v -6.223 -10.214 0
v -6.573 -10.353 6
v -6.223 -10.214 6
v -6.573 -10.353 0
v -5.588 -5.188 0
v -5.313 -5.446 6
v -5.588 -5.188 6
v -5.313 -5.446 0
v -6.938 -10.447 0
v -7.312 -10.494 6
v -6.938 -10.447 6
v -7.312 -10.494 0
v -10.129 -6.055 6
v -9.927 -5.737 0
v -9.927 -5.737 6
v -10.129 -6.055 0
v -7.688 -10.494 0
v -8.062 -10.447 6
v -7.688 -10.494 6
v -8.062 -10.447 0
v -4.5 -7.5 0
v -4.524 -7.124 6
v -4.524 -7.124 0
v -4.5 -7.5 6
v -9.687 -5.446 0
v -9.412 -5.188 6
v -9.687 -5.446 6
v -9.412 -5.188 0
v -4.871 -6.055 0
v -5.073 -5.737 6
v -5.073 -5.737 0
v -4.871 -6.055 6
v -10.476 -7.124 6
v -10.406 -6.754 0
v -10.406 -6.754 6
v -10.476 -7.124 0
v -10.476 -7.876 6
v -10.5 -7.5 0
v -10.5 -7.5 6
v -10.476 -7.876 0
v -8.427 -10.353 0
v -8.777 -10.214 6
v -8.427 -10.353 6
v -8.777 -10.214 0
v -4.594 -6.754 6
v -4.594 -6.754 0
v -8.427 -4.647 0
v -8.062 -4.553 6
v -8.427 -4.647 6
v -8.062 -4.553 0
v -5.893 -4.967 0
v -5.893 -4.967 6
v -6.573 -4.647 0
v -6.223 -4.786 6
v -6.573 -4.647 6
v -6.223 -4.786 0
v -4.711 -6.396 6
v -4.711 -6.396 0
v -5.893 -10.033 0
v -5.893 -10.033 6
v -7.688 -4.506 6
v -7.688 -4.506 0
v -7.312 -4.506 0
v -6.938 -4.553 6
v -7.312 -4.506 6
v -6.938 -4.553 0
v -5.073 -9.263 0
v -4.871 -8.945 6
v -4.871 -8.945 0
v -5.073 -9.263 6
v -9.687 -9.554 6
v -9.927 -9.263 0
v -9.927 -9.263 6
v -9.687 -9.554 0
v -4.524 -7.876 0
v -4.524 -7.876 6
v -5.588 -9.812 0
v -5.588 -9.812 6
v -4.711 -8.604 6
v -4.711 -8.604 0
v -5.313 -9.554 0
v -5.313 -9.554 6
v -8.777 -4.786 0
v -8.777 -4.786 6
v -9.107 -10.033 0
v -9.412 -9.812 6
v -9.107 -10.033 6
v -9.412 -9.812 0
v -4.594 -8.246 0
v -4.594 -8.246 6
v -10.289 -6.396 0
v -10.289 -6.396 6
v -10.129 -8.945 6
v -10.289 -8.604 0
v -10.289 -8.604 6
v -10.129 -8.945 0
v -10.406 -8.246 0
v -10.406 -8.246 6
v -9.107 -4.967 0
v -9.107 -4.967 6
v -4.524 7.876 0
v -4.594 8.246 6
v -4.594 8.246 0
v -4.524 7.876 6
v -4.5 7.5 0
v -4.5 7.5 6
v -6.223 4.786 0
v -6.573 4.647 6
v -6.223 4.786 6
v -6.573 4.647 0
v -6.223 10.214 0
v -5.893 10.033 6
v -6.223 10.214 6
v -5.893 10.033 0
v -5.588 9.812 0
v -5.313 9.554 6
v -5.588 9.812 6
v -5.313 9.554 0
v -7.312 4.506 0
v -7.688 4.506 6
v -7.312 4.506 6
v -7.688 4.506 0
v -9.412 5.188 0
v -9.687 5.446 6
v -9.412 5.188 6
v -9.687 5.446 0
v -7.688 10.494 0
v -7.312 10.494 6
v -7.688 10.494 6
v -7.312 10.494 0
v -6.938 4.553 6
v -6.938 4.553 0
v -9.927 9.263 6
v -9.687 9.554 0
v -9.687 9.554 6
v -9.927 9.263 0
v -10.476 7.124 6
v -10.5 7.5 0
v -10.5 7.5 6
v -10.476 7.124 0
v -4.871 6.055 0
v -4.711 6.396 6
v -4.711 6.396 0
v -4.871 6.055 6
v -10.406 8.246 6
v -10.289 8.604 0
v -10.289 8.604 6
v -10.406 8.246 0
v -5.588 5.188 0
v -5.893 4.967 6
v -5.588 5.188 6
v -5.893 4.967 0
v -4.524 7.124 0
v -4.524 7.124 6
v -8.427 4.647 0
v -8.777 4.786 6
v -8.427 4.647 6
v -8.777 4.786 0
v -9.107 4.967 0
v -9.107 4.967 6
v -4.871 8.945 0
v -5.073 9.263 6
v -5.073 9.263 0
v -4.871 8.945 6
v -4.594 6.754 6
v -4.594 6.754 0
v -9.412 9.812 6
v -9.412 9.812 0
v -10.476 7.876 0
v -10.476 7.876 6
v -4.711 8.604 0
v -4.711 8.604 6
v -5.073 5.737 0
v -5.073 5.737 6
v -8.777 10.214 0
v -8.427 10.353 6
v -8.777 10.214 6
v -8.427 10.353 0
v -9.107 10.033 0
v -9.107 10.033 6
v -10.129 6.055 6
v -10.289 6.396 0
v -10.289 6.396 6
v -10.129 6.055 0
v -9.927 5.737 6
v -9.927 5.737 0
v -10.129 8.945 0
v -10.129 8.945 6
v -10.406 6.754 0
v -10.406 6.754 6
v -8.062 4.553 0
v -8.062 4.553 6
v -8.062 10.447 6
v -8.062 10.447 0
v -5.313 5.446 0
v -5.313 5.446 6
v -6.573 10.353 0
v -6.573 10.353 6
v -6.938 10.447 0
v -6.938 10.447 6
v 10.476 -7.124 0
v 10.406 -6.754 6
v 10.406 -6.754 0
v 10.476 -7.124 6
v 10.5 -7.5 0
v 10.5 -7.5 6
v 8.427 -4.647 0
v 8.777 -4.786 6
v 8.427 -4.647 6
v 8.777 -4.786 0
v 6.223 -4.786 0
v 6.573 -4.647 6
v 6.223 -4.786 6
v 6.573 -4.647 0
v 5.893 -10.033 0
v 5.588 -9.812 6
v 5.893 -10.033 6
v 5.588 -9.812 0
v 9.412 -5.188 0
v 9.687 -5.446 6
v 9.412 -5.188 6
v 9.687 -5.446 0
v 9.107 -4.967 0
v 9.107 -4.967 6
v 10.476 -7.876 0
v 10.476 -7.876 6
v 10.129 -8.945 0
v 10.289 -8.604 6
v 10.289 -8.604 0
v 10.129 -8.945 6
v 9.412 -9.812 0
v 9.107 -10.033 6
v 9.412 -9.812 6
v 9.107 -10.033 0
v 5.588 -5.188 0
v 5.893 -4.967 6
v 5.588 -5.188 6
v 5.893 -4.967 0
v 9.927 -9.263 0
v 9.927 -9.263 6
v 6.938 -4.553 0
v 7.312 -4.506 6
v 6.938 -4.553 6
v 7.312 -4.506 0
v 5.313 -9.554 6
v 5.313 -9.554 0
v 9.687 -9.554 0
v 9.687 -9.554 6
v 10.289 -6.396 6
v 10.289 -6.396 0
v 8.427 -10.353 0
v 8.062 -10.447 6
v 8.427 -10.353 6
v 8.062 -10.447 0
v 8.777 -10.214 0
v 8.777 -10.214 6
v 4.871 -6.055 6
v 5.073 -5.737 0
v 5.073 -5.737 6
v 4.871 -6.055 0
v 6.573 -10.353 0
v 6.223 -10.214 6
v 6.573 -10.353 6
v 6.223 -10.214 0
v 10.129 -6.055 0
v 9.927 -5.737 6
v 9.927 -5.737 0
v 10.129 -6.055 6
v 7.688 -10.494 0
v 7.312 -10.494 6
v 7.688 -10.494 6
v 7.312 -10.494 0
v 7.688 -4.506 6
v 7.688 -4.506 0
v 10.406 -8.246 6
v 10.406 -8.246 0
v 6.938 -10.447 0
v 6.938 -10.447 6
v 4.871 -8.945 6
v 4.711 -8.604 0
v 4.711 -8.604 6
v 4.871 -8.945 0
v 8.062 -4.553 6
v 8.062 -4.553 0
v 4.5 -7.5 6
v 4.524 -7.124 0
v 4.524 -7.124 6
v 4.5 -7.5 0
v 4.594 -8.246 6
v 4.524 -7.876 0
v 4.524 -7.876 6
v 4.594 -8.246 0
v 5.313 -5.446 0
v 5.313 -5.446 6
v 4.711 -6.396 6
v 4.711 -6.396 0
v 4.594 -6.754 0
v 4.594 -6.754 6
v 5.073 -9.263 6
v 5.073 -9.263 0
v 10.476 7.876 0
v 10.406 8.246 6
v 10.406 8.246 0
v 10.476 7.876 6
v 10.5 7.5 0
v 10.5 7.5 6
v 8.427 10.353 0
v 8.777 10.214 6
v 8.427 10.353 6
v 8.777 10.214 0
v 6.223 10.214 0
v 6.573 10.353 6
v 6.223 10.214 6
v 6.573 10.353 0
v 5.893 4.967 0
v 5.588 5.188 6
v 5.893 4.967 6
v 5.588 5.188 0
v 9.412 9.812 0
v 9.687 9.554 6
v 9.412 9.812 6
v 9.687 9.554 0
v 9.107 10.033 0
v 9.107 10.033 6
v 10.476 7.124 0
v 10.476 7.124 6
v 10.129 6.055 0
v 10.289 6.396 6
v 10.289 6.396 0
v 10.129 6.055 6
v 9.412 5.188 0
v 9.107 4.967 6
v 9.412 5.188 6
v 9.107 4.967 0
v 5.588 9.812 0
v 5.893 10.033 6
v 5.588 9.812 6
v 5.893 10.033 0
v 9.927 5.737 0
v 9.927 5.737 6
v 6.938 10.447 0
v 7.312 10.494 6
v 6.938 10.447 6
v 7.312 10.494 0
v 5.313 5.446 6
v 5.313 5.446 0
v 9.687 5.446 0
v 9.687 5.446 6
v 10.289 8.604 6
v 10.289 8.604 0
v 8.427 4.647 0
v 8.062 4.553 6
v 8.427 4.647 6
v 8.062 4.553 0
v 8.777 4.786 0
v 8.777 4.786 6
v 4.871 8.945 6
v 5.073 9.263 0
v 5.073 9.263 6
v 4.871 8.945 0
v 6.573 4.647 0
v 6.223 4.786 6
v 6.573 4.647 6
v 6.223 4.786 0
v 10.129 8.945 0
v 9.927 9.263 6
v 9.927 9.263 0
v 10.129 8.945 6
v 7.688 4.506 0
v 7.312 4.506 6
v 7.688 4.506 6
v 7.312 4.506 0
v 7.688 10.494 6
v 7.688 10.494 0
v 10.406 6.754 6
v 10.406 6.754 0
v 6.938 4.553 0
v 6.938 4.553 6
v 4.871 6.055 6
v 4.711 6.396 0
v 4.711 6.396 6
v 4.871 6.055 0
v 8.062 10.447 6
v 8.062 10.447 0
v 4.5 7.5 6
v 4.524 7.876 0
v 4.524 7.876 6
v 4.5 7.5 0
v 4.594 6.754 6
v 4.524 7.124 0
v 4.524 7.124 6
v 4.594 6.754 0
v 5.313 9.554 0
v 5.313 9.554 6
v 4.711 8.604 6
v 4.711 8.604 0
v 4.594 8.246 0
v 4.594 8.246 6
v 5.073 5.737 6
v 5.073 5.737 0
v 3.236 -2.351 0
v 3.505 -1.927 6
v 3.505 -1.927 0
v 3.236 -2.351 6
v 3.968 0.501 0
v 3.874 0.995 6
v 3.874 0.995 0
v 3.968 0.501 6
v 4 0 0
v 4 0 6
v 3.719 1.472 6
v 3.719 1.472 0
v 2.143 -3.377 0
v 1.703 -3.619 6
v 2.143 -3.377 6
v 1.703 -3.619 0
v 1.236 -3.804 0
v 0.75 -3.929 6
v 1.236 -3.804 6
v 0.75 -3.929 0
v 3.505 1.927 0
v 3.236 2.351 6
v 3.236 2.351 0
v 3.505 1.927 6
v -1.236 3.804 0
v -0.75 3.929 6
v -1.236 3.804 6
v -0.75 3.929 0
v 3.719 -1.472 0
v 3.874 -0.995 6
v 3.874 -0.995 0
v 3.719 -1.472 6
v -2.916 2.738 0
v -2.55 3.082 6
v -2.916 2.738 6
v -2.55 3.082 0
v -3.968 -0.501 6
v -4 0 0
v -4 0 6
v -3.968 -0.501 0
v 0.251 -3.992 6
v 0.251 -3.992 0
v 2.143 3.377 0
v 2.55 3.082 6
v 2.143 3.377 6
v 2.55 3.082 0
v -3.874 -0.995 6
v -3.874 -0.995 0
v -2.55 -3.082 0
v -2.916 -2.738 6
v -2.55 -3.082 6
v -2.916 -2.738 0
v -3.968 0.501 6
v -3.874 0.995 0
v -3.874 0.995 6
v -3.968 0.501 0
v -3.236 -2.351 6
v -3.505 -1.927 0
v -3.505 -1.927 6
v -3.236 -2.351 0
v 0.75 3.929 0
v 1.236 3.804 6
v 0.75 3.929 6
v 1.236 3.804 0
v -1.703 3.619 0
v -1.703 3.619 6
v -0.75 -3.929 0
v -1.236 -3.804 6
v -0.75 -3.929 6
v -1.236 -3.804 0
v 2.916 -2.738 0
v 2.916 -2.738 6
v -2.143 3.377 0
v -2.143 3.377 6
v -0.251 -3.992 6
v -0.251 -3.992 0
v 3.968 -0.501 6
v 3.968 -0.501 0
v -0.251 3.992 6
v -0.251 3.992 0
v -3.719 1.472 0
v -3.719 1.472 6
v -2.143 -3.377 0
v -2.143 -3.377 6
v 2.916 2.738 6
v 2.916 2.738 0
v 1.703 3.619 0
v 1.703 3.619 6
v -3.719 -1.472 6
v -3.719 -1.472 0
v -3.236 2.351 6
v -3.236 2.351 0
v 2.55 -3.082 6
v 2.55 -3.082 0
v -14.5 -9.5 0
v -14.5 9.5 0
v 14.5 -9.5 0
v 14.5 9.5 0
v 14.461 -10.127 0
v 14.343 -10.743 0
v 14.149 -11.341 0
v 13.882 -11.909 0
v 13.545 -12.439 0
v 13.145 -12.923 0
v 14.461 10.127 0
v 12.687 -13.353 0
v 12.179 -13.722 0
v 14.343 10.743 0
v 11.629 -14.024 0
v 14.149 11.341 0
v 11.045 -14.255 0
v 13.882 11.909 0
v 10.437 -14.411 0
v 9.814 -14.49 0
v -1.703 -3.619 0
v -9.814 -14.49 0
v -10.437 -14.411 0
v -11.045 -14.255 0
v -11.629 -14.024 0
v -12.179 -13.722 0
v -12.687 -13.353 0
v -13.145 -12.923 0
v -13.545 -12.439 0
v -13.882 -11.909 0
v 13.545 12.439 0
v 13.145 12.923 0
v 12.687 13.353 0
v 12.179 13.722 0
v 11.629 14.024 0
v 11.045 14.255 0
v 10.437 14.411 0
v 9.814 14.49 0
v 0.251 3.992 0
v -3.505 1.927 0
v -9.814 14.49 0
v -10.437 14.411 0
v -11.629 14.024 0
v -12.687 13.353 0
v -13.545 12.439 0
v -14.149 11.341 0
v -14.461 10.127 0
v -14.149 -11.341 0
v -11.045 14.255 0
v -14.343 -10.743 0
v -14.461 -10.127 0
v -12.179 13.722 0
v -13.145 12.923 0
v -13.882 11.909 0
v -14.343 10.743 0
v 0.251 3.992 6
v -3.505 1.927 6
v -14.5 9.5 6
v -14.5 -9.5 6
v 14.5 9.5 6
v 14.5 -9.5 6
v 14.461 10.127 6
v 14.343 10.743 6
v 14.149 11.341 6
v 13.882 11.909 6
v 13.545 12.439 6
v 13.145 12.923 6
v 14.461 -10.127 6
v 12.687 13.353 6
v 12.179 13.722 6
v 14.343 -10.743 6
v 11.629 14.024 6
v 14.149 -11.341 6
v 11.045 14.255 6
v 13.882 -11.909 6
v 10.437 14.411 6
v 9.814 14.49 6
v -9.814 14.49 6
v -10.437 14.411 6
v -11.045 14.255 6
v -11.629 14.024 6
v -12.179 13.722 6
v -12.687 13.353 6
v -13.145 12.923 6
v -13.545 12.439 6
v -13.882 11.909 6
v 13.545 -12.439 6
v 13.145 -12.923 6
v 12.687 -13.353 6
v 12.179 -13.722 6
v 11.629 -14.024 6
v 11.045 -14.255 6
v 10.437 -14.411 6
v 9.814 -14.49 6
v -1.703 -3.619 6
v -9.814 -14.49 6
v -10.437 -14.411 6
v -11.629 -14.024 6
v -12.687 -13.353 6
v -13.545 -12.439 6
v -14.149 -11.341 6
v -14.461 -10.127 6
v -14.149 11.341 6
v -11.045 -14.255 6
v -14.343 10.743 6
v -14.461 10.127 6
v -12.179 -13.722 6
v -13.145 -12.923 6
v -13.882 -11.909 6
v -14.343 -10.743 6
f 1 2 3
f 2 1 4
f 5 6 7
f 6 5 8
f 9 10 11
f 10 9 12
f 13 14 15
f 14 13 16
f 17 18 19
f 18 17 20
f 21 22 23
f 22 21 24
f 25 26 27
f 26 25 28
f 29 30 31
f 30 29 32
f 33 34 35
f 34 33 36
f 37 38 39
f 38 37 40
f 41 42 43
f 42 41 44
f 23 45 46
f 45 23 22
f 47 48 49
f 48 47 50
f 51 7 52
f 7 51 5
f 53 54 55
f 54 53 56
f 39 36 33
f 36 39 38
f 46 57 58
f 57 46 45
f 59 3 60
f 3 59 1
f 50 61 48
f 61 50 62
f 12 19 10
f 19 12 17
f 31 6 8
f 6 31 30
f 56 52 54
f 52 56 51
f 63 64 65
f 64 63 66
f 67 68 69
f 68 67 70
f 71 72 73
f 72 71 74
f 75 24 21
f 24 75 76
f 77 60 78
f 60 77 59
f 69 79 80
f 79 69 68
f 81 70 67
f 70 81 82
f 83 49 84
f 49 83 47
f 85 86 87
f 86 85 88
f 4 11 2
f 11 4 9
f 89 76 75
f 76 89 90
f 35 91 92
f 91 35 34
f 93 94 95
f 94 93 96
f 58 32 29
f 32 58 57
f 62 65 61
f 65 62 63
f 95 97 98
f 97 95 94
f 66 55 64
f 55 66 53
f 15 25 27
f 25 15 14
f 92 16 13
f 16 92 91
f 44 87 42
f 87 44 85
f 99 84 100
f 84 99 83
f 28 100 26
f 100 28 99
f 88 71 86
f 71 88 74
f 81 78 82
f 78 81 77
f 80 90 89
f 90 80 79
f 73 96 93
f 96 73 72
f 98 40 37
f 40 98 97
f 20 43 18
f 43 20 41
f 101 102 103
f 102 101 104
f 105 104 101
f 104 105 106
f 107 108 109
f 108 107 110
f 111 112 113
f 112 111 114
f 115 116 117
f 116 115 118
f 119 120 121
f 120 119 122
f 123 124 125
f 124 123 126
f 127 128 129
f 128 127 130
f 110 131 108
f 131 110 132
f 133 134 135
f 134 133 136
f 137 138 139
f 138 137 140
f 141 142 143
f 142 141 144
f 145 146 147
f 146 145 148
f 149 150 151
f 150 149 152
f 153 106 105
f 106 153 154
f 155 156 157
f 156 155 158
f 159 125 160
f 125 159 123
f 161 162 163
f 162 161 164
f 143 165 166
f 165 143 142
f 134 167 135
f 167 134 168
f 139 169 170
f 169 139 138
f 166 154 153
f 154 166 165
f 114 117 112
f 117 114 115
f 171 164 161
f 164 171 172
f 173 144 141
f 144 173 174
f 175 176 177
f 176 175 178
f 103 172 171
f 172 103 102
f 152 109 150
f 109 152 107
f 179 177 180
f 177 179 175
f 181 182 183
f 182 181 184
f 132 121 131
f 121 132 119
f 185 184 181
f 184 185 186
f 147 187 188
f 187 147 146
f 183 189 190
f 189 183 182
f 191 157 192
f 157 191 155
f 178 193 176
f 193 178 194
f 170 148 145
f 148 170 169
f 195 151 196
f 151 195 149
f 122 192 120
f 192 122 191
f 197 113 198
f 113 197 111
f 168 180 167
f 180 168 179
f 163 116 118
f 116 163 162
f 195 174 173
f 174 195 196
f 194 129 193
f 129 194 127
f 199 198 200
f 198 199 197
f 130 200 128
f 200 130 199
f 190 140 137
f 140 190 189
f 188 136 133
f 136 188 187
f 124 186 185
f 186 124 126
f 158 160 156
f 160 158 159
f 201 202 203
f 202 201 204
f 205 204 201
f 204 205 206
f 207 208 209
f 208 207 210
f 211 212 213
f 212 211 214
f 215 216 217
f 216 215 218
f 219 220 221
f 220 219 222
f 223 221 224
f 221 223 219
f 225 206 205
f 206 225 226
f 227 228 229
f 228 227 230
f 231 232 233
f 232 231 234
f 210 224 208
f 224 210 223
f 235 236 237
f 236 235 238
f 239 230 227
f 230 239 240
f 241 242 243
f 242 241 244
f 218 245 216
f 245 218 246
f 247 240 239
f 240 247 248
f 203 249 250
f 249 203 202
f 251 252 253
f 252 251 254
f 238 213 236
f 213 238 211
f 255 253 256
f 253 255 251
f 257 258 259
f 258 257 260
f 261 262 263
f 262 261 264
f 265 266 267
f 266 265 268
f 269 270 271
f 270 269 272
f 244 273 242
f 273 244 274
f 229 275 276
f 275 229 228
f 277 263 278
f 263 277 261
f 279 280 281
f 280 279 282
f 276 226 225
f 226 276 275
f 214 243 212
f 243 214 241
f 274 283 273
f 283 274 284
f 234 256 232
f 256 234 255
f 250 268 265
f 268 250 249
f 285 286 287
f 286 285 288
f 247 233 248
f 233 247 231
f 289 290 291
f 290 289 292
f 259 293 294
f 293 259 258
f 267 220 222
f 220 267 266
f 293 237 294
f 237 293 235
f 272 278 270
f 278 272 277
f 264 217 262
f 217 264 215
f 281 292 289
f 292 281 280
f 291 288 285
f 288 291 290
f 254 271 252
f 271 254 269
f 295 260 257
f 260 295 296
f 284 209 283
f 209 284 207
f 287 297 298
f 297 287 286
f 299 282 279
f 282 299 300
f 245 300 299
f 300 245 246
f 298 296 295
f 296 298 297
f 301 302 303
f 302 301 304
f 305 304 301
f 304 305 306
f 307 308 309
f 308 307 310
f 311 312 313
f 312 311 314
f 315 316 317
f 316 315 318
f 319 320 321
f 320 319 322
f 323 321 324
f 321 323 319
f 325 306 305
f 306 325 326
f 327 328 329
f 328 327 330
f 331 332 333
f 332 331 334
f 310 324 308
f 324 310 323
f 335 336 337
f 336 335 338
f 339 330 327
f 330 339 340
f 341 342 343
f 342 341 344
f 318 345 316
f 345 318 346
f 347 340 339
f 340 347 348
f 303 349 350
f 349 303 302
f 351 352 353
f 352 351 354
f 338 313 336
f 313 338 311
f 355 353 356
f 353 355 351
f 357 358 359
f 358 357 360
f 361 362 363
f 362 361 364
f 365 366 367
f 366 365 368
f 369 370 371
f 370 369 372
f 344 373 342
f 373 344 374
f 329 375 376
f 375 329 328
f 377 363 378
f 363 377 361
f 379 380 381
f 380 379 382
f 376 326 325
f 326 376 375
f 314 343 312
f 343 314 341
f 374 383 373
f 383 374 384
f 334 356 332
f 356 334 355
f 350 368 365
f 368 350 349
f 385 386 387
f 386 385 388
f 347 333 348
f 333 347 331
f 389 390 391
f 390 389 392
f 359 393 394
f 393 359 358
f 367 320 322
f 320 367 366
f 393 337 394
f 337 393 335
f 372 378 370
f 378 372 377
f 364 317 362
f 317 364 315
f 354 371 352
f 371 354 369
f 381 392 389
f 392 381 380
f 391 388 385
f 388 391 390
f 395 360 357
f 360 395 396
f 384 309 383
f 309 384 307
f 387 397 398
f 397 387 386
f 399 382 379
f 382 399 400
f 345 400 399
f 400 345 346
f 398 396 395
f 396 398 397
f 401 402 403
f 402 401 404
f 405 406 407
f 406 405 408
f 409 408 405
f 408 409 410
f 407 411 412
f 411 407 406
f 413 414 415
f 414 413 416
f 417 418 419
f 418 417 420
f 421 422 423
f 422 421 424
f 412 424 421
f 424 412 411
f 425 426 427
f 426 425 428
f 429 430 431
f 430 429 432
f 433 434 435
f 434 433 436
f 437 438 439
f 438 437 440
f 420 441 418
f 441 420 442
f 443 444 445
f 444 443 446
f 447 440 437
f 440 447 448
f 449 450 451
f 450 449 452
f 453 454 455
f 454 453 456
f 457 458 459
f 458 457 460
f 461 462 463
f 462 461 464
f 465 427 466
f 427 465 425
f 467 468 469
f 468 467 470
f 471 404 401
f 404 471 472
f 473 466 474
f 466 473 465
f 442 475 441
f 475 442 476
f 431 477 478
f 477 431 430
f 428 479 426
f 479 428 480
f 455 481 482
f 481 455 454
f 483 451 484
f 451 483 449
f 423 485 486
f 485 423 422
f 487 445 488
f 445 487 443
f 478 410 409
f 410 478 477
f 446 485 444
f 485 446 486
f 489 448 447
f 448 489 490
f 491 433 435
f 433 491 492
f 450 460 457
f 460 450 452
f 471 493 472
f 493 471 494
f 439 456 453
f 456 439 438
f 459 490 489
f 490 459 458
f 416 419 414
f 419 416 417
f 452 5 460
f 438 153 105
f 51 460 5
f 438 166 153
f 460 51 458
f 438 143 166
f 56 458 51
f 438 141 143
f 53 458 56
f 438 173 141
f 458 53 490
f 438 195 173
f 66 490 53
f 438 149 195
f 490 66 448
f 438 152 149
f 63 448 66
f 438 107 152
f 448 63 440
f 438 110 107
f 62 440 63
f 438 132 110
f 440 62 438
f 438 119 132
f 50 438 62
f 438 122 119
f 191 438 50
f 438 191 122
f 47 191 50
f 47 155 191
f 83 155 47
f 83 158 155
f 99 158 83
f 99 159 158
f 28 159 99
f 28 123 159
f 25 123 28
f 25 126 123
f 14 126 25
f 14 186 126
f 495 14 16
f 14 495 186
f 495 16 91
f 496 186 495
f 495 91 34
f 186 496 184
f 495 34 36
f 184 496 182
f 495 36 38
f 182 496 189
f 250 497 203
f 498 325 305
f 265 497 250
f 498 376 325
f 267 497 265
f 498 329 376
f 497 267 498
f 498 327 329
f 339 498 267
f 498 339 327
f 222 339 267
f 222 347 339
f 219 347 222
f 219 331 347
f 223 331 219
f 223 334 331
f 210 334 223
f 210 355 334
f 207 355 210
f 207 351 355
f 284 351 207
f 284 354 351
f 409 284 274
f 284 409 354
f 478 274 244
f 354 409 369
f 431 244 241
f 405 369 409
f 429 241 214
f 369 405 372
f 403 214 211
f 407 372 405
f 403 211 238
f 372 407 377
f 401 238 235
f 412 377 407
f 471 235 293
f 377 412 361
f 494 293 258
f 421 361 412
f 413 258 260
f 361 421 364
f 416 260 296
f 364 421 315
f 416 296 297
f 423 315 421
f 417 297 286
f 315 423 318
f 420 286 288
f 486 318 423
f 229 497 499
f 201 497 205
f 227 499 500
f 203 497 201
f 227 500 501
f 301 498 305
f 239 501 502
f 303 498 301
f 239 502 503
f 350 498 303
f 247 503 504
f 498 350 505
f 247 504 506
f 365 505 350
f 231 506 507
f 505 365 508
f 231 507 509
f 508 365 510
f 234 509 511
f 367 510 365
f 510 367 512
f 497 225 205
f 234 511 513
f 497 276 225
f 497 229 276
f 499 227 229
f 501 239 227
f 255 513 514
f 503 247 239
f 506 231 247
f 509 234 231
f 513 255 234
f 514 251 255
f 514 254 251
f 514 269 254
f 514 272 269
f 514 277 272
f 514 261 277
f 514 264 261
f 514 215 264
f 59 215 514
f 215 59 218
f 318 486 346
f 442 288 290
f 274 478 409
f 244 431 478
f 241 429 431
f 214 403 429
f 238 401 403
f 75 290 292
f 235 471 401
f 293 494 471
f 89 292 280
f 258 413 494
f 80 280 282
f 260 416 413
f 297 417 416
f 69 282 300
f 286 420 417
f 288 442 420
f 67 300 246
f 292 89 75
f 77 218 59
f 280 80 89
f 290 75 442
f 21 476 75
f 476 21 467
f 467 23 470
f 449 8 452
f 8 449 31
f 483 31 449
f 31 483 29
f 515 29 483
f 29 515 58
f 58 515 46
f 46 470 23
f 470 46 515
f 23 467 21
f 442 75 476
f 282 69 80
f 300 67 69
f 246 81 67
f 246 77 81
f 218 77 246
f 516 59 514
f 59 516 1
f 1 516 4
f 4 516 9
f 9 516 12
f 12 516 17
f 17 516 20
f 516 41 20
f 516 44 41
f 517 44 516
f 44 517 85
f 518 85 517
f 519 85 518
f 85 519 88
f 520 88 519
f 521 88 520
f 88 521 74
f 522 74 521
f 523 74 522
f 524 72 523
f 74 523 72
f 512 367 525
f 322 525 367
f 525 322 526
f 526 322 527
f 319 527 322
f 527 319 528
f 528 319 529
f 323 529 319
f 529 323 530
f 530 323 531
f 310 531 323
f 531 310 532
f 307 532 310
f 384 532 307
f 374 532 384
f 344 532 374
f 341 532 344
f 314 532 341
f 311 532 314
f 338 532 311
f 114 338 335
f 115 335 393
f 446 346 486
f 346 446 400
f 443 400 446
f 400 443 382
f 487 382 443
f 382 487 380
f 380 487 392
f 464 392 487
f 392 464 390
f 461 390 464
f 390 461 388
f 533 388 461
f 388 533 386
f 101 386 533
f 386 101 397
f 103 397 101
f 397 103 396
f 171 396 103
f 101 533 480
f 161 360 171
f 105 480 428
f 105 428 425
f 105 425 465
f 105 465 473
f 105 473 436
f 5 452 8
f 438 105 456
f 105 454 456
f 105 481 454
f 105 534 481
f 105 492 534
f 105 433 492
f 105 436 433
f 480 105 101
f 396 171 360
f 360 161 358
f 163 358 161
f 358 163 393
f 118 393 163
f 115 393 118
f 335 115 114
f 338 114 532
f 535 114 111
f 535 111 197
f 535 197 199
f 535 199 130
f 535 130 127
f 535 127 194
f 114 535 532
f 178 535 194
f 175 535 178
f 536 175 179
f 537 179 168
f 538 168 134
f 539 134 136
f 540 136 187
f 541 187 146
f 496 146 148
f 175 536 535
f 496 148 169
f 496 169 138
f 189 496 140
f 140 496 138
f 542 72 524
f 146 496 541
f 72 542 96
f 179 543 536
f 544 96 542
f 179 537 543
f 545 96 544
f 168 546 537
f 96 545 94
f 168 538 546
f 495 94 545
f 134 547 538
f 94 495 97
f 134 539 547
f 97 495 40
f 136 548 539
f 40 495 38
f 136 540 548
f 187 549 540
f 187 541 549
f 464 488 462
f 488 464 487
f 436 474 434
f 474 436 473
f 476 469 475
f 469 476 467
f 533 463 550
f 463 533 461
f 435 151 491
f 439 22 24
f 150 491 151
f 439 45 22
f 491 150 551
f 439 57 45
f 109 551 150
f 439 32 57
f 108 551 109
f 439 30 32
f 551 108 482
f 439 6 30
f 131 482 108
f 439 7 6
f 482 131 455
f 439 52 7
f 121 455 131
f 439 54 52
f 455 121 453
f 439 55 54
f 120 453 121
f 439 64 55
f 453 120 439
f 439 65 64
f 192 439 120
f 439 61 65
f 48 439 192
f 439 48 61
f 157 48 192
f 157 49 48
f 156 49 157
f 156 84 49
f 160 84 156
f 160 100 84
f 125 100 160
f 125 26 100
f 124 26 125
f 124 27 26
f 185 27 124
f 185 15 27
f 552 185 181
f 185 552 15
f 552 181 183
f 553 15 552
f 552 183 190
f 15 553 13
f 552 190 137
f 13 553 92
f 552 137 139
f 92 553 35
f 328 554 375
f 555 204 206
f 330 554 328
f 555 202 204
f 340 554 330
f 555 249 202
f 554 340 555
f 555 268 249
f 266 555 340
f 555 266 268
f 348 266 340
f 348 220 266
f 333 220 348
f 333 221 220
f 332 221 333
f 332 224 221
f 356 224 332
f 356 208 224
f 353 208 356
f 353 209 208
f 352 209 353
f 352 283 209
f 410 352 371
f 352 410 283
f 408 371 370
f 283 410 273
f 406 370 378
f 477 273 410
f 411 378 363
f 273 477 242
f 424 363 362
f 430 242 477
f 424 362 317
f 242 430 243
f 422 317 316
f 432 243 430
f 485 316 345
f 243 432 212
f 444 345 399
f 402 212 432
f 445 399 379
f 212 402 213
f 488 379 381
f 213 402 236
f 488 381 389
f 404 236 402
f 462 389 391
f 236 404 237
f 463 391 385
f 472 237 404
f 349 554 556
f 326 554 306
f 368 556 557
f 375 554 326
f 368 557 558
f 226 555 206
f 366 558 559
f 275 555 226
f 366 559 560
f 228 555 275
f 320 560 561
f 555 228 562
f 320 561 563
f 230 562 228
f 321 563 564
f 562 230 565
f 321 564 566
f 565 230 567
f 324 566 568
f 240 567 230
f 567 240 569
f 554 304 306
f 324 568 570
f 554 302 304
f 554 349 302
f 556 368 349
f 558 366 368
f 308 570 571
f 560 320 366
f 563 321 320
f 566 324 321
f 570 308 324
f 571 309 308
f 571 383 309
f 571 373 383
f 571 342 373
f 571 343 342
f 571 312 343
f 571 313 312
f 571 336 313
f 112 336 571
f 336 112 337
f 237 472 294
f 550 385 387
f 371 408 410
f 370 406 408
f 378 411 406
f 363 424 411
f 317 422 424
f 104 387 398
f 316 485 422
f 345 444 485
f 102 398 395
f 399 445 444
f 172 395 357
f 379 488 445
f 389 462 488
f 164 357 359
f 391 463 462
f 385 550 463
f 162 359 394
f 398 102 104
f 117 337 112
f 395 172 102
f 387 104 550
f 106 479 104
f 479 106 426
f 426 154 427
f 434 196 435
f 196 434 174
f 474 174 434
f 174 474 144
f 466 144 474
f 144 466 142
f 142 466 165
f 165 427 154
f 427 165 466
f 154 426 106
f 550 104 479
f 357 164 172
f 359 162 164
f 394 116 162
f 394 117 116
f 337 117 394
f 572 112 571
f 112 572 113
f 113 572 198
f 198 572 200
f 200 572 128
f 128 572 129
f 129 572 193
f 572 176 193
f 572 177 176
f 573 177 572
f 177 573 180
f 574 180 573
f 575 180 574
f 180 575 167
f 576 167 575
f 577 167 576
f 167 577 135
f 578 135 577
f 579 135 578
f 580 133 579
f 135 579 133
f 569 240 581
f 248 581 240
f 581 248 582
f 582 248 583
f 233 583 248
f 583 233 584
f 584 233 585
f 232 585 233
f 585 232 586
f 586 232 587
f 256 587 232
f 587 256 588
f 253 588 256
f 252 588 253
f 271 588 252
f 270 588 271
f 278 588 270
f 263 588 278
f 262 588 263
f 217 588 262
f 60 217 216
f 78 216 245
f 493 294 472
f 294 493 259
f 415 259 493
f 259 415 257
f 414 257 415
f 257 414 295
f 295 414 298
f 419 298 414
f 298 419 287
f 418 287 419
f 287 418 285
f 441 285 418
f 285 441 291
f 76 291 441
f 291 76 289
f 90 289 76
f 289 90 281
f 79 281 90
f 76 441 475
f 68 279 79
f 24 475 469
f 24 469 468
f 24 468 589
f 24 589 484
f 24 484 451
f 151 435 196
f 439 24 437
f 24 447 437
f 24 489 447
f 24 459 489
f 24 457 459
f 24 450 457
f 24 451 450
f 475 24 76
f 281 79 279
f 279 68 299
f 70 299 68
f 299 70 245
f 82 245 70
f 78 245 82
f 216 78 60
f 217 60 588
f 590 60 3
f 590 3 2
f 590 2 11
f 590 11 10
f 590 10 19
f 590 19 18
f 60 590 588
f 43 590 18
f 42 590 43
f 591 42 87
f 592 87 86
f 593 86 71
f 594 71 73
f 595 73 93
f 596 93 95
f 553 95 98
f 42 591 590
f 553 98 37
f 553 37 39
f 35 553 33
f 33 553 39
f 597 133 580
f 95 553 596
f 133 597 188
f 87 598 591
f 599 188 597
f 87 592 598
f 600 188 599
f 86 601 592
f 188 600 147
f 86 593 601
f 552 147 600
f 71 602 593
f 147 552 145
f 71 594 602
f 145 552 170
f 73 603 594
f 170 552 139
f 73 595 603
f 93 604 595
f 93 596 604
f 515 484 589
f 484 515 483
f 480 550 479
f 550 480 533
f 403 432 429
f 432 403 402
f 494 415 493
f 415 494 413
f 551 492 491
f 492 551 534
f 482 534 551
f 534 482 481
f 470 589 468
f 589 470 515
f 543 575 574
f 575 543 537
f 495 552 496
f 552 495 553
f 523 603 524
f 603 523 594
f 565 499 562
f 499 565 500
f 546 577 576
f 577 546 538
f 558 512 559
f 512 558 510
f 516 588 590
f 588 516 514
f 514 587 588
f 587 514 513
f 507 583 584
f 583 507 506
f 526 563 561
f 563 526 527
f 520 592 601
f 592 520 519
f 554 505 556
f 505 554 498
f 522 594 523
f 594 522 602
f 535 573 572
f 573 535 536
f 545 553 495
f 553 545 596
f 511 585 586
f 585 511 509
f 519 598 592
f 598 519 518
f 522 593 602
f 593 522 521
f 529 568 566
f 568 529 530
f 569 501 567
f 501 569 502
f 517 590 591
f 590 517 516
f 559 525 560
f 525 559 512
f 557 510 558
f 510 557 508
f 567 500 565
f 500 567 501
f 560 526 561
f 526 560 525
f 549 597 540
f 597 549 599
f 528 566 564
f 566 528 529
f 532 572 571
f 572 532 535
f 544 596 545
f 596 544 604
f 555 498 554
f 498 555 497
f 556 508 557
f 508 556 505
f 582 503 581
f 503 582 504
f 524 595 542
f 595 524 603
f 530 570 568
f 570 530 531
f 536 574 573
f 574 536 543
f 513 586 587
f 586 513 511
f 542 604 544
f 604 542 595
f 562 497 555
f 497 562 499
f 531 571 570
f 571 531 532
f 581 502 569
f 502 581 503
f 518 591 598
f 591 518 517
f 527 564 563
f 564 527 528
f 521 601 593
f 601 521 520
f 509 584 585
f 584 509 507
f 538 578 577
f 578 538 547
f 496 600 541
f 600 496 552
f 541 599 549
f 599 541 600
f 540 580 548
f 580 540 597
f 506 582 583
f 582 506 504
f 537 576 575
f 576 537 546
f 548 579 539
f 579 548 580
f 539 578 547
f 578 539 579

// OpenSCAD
$fn = 50;


difference() {
	union() {
		hull() {
			translate(v = [-9.5000000000, 9.5000000000, 0]) {
				cylinder(h = 6, r = 5);
			}
			translate(v = [9.5000000000, 9.5000000000, 0]) {
				cylinder(h = 6, r = 5);
			}
			translate(v = [-9.5000000000, -9.5000000000, 0]) {
				cylinder(h = 6, r = 5);
			}
			translate(v = [9.5000000000, -9.5000000000, 0]) {
				cylinder(h = 6, r = 5);
			}
		}
	}
	union() {
		#translate(v = [-7.5000000000, -7.5000000000, -100.0000000000]) {
			cylinder(h = 200, r = 3.0000000000);
		}
		#translate(v = [-7.5000000000, 7.5000000000, -100.0000000000]) {
			cylinder(h = 200, r = 3.0000000000);
		}
		#translate(v = [7.5000000000, -7.5000000000, -100.0000000000]) {
			cylinder(h = 200, r = 3.0000000000);
		}
		#translate(v = [7.5000000000, 7.5000000000, -100.0000000000]) {
			cylinder(h = 200, r = 3.0000000000);
		}
		#cylinder(h = 6, r = 4.0000000000);
	}
}
